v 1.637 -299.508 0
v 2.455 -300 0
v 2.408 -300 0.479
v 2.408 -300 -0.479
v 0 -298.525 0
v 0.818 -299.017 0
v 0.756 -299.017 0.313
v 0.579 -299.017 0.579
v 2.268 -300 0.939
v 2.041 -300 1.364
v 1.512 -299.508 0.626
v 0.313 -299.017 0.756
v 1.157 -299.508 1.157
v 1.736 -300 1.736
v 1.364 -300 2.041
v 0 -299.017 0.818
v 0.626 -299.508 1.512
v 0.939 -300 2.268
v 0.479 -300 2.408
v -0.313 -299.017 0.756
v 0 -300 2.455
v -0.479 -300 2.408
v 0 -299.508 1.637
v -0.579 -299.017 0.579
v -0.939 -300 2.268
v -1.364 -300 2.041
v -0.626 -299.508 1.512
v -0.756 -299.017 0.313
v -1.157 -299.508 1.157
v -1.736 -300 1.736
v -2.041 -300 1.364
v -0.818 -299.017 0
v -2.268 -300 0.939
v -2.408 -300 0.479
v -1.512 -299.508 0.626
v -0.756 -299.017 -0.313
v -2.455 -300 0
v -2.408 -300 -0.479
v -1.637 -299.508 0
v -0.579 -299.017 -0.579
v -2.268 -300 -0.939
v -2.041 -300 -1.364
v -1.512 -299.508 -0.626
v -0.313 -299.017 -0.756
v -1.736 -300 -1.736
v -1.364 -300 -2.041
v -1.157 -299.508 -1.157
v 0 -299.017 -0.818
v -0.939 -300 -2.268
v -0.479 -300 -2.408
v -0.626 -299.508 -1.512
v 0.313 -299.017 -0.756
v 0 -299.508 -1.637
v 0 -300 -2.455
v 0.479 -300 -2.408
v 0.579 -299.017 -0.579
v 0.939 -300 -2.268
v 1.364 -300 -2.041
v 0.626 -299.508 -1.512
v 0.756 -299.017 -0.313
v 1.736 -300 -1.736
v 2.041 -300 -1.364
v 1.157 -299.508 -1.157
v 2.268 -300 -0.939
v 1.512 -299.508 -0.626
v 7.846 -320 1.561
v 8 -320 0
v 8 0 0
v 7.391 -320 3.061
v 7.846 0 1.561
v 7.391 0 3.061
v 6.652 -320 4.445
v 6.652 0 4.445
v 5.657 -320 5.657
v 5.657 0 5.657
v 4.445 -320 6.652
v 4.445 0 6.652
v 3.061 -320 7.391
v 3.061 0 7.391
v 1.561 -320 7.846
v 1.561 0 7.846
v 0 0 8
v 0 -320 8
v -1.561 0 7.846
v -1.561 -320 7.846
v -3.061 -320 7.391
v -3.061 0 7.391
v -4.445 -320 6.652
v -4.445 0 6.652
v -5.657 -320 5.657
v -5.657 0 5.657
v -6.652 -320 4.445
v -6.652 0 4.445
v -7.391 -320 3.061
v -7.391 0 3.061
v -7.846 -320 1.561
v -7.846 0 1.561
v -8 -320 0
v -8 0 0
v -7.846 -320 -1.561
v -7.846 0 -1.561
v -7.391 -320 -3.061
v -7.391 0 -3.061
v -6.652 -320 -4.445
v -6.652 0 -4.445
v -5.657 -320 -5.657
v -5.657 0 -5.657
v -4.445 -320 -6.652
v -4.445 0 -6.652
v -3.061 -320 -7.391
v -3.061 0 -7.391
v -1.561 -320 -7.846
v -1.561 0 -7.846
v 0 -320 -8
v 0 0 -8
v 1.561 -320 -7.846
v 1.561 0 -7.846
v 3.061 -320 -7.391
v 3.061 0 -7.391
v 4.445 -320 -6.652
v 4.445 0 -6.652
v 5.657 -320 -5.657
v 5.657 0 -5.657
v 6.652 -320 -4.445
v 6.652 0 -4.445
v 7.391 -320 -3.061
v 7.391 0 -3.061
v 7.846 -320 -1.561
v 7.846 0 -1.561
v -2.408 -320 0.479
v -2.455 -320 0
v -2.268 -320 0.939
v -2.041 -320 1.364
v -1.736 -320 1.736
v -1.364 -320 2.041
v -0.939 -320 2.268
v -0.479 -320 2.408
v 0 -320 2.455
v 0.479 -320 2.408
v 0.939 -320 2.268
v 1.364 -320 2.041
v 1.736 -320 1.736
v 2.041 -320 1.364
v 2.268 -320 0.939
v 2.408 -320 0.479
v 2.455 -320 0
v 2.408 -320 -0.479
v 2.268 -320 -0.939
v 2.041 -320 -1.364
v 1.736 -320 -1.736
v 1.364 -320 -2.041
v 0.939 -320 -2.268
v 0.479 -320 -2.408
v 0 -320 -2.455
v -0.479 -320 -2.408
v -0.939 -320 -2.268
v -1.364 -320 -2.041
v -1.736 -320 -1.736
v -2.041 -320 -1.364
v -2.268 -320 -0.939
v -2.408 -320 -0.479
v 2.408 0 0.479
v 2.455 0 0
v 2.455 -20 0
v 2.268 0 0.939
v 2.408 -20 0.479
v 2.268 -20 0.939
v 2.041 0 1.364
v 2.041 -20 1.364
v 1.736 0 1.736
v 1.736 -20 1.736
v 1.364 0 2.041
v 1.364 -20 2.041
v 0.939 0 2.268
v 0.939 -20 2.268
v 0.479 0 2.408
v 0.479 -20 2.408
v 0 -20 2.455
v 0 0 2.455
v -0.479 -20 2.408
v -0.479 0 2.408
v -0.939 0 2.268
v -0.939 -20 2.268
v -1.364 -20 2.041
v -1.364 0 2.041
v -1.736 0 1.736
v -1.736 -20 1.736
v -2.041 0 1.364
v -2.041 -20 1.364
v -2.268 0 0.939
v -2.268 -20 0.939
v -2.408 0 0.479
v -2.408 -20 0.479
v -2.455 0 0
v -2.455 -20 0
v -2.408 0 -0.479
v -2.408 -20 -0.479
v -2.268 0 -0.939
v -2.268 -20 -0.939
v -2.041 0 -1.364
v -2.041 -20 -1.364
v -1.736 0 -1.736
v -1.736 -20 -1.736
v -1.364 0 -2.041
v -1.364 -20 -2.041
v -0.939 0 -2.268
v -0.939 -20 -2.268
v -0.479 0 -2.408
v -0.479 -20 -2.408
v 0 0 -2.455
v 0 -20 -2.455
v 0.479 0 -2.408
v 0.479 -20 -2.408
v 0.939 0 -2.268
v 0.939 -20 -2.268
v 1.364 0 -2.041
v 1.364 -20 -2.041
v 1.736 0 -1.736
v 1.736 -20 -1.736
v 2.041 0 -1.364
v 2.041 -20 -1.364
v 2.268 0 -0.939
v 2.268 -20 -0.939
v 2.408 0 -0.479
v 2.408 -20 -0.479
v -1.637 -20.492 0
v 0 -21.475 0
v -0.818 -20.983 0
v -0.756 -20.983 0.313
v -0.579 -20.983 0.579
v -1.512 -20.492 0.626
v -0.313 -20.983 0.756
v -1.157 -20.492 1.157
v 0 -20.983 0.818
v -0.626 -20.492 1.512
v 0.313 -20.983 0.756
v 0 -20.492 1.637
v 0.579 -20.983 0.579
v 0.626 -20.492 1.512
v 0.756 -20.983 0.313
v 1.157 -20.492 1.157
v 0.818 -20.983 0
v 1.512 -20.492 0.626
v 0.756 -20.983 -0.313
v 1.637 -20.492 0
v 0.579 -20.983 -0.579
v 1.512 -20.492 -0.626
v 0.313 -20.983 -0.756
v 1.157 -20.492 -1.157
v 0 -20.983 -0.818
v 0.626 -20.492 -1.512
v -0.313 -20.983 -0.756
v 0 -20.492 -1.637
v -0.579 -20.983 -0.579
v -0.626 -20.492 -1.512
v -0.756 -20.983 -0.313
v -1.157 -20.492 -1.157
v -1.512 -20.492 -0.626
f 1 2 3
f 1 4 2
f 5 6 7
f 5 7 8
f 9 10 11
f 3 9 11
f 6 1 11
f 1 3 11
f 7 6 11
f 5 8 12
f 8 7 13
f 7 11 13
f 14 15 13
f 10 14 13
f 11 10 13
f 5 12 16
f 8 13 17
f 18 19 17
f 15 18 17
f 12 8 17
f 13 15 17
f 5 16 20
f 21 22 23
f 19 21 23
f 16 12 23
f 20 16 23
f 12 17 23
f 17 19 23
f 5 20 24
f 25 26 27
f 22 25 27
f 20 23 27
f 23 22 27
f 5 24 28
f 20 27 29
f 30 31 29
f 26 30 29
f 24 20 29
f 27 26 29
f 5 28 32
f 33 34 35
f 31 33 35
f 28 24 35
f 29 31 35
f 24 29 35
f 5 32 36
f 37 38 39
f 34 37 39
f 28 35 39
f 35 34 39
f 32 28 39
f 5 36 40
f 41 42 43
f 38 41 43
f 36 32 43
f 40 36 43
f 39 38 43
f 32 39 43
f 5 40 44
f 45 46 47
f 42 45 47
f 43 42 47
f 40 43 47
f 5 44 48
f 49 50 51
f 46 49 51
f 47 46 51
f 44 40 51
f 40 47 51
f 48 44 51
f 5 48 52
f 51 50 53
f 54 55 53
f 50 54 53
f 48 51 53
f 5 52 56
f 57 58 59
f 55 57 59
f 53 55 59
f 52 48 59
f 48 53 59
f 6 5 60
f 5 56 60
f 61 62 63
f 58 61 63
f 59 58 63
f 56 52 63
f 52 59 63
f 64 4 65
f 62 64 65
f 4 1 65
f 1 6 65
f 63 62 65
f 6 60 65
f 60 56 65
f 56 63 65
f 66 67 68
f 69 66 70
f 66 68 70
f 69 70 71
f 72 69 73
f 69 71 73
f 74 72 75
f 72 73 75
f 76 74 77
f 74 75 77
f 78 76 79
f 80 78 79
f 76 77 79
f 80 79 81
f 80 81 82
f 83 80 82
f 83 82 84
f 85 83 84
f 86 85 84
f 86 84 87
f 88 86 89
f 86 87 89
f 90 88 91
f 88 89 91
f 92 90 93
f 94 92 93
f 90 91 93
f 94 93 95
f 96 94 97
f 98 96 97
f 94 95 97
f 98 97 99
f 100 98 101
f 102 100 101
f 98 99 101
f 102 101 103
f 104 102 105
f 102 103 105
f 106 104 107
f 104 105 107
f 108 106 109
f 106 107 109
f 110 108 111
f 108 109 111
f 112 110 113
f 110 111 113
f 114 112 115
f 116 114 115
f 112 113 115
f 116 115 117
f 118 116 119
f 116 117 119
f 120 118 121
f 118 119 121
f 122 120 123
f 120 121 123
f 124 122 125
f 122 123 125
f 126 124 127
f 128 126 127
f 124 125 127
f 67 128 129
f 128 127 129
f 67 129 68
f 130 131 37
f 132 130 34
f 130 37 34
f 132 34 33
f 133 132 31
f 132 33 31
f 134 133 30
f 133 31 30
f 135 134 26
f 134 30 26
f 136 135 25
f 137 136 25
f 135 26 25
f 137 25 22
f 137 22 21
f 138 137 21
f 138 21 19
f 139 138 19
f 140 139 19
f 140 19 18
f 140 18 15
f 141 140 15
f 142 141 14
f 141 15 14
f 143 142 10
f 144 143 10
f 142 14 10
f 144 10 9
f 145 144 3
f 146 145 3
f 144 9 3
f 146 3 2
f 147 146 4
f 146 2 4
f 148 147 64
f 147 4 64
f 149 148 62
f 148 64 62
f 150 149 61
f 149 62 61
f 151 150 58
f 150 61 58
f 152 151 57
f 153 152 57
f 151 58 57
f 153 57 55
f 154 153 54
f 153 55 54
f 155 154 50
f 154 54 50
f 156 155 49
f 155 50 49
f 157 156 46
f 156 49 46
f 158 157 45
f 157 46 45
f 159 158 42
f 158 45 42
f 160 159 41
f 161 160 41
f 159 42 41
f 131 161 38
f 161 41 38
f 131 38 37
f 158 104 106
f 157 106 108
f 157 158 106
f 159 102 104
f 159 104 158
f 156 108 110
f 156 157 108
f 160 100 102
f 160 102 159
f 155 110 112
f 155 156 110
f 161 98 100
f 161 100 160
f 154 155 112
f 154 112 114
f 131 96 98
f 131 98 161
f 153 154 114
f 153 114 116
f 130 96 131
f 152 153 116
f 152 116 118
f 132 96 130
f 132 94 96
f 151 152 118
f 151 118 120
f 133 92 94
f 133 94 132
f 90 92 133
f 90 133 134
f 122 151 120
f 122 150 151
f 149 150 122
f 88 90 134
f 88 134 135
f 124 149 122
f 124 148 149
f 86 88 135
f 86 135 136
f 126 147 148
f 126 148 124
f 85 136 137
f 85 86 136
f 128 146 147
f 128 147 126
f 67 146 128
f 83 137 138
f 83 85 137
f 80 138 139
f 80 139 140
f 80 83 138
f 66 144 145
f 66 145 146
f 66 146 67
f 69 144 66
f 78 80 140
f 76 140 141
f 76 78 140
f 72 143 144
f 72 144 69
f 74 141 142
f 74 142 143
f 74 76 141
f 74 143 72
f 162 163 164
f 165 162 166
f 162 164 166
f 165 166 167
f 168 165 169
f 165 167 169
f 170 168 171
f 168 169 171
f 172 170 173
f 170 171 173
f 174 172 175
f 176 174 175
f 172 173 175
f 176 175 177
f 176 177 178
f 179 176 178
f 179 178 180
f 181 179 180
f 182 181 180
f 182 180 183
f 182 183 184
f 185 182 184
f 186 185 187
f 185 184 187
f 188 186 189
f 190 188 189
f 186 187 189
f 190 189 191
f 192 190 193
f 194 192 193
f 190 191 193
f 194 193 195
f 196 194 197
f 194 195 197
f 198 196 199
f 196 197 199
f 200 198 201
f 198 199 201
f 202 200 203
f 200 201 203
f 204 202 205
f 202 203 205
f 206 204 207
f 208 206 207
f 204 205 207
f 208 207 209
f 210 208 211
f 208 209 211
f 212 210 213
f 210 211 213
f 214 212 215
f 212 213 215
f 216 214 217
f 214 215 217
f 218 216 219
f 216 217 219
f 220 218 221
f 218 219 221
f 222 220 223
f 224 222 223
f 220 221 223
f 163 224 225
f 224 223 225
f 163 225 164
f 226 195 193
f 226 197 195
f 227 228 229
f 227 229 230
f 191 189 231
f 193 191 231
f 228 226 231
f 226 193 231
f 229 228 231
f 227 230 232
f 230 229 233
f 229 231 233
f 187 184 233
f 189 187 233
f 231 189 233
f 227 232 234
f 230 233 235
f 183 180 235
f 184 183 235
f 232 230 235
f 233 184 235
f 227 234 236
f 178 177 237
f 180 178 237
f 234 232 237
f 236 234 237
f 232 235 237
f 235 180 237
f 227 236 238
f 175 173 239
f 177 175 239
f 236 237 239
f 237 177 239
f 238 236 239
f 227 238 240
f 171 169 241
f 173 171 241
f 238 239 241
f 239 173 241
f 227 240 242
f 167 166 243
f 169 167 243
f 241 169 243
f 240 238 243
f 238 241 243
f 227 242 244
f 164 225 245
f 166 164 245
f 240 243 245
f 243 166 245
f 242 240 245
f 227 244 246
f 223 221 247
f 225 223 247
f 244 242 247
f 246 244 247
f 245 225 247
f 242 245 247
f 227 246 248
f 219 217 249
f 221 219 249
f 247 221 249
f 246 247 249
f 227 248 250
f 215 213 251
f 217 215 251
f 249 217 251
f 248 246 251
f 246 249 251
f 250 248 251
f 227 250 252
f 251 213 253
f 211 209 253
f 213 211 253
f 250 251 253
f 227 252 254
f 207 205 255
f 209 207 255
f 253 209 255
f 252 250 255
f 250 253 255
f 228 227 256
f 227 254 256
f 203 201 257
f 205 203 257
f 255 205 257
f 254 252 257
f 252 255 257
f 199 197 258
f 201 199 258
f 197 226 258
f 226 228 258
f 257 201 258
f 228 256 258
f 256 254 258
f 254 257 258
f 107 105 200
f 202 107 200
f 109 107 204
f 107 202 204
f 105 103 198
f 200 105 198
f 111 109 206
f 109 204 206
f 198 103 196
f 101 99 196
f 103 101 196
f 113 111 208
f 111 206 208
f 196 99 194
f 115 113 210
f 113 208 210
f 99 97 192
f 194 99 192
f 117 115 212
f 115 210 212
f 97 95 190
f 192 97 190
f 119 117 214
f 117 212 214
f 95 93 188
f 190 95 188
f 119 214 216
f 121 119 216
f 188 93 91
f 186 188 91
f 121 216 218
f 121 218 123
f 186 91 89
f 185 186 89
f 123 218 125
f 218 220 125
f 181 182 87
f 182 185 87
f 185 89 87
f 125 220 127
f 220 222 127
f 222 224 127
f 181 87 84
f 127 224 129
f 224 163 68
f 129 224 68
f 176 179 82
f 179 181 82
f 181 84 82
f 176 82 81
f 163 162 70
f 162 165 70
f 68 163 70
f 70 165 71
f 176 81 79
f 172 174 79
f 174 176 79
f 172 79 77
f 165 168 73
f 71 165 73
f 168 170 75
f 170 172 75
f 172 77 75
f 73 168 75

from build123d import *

# Parameters (mm, degrees)
F0_R     = 8
F0_R_2   = 2.455
F1_DEPTH = 320
F4_D     = 4.91
F4_DEPTH = 20
F4_TIP   = 1.4751128197
F5_D     = 4.91
F5_DEPTH = 20
F5_TIP   = 1.4751128197


with BuildPart() as f1:
    # F0 (on Front) → F1 (new body)
    with BuildSketch(Plane.XZ):
        Circle(F0_R)
        Circle(F0_R_2, mode=Mode.SUBTRACT)
        Circle(F0_R_2)
    extrude(amount=F1_DEPTH)

    # F4
    with Locations(Plane.XZ.offset(320)):
        with Locations((0, 0)):
            Hole(F4_D / 2, depth=F4_DEPTH)
            with Locations((0, 0, -(F4_DEPTH + F4_TIP / 2))):  # 118° drill point
                Cone(0, F4_D / 2, F4_TIP, mode=Mode.SUBTRACT)

    # F5
    with Locations(Plane(origin=(0, 0, 0), x_dir=(-1, 0, 0), z_dir=(0, 1, 0))):
        with Locations((0, 0)):
            Hole(F5_D / 2, depth=F5_DEPTH)
            with Locations((0, 0, -(F5_DEPTH + F5_TIP / 2))):  # 118° drill point
                Cone(0, F5_D / 2, F5_TIP, mode=Mode.SUBTRACT)


solid = f1.part
